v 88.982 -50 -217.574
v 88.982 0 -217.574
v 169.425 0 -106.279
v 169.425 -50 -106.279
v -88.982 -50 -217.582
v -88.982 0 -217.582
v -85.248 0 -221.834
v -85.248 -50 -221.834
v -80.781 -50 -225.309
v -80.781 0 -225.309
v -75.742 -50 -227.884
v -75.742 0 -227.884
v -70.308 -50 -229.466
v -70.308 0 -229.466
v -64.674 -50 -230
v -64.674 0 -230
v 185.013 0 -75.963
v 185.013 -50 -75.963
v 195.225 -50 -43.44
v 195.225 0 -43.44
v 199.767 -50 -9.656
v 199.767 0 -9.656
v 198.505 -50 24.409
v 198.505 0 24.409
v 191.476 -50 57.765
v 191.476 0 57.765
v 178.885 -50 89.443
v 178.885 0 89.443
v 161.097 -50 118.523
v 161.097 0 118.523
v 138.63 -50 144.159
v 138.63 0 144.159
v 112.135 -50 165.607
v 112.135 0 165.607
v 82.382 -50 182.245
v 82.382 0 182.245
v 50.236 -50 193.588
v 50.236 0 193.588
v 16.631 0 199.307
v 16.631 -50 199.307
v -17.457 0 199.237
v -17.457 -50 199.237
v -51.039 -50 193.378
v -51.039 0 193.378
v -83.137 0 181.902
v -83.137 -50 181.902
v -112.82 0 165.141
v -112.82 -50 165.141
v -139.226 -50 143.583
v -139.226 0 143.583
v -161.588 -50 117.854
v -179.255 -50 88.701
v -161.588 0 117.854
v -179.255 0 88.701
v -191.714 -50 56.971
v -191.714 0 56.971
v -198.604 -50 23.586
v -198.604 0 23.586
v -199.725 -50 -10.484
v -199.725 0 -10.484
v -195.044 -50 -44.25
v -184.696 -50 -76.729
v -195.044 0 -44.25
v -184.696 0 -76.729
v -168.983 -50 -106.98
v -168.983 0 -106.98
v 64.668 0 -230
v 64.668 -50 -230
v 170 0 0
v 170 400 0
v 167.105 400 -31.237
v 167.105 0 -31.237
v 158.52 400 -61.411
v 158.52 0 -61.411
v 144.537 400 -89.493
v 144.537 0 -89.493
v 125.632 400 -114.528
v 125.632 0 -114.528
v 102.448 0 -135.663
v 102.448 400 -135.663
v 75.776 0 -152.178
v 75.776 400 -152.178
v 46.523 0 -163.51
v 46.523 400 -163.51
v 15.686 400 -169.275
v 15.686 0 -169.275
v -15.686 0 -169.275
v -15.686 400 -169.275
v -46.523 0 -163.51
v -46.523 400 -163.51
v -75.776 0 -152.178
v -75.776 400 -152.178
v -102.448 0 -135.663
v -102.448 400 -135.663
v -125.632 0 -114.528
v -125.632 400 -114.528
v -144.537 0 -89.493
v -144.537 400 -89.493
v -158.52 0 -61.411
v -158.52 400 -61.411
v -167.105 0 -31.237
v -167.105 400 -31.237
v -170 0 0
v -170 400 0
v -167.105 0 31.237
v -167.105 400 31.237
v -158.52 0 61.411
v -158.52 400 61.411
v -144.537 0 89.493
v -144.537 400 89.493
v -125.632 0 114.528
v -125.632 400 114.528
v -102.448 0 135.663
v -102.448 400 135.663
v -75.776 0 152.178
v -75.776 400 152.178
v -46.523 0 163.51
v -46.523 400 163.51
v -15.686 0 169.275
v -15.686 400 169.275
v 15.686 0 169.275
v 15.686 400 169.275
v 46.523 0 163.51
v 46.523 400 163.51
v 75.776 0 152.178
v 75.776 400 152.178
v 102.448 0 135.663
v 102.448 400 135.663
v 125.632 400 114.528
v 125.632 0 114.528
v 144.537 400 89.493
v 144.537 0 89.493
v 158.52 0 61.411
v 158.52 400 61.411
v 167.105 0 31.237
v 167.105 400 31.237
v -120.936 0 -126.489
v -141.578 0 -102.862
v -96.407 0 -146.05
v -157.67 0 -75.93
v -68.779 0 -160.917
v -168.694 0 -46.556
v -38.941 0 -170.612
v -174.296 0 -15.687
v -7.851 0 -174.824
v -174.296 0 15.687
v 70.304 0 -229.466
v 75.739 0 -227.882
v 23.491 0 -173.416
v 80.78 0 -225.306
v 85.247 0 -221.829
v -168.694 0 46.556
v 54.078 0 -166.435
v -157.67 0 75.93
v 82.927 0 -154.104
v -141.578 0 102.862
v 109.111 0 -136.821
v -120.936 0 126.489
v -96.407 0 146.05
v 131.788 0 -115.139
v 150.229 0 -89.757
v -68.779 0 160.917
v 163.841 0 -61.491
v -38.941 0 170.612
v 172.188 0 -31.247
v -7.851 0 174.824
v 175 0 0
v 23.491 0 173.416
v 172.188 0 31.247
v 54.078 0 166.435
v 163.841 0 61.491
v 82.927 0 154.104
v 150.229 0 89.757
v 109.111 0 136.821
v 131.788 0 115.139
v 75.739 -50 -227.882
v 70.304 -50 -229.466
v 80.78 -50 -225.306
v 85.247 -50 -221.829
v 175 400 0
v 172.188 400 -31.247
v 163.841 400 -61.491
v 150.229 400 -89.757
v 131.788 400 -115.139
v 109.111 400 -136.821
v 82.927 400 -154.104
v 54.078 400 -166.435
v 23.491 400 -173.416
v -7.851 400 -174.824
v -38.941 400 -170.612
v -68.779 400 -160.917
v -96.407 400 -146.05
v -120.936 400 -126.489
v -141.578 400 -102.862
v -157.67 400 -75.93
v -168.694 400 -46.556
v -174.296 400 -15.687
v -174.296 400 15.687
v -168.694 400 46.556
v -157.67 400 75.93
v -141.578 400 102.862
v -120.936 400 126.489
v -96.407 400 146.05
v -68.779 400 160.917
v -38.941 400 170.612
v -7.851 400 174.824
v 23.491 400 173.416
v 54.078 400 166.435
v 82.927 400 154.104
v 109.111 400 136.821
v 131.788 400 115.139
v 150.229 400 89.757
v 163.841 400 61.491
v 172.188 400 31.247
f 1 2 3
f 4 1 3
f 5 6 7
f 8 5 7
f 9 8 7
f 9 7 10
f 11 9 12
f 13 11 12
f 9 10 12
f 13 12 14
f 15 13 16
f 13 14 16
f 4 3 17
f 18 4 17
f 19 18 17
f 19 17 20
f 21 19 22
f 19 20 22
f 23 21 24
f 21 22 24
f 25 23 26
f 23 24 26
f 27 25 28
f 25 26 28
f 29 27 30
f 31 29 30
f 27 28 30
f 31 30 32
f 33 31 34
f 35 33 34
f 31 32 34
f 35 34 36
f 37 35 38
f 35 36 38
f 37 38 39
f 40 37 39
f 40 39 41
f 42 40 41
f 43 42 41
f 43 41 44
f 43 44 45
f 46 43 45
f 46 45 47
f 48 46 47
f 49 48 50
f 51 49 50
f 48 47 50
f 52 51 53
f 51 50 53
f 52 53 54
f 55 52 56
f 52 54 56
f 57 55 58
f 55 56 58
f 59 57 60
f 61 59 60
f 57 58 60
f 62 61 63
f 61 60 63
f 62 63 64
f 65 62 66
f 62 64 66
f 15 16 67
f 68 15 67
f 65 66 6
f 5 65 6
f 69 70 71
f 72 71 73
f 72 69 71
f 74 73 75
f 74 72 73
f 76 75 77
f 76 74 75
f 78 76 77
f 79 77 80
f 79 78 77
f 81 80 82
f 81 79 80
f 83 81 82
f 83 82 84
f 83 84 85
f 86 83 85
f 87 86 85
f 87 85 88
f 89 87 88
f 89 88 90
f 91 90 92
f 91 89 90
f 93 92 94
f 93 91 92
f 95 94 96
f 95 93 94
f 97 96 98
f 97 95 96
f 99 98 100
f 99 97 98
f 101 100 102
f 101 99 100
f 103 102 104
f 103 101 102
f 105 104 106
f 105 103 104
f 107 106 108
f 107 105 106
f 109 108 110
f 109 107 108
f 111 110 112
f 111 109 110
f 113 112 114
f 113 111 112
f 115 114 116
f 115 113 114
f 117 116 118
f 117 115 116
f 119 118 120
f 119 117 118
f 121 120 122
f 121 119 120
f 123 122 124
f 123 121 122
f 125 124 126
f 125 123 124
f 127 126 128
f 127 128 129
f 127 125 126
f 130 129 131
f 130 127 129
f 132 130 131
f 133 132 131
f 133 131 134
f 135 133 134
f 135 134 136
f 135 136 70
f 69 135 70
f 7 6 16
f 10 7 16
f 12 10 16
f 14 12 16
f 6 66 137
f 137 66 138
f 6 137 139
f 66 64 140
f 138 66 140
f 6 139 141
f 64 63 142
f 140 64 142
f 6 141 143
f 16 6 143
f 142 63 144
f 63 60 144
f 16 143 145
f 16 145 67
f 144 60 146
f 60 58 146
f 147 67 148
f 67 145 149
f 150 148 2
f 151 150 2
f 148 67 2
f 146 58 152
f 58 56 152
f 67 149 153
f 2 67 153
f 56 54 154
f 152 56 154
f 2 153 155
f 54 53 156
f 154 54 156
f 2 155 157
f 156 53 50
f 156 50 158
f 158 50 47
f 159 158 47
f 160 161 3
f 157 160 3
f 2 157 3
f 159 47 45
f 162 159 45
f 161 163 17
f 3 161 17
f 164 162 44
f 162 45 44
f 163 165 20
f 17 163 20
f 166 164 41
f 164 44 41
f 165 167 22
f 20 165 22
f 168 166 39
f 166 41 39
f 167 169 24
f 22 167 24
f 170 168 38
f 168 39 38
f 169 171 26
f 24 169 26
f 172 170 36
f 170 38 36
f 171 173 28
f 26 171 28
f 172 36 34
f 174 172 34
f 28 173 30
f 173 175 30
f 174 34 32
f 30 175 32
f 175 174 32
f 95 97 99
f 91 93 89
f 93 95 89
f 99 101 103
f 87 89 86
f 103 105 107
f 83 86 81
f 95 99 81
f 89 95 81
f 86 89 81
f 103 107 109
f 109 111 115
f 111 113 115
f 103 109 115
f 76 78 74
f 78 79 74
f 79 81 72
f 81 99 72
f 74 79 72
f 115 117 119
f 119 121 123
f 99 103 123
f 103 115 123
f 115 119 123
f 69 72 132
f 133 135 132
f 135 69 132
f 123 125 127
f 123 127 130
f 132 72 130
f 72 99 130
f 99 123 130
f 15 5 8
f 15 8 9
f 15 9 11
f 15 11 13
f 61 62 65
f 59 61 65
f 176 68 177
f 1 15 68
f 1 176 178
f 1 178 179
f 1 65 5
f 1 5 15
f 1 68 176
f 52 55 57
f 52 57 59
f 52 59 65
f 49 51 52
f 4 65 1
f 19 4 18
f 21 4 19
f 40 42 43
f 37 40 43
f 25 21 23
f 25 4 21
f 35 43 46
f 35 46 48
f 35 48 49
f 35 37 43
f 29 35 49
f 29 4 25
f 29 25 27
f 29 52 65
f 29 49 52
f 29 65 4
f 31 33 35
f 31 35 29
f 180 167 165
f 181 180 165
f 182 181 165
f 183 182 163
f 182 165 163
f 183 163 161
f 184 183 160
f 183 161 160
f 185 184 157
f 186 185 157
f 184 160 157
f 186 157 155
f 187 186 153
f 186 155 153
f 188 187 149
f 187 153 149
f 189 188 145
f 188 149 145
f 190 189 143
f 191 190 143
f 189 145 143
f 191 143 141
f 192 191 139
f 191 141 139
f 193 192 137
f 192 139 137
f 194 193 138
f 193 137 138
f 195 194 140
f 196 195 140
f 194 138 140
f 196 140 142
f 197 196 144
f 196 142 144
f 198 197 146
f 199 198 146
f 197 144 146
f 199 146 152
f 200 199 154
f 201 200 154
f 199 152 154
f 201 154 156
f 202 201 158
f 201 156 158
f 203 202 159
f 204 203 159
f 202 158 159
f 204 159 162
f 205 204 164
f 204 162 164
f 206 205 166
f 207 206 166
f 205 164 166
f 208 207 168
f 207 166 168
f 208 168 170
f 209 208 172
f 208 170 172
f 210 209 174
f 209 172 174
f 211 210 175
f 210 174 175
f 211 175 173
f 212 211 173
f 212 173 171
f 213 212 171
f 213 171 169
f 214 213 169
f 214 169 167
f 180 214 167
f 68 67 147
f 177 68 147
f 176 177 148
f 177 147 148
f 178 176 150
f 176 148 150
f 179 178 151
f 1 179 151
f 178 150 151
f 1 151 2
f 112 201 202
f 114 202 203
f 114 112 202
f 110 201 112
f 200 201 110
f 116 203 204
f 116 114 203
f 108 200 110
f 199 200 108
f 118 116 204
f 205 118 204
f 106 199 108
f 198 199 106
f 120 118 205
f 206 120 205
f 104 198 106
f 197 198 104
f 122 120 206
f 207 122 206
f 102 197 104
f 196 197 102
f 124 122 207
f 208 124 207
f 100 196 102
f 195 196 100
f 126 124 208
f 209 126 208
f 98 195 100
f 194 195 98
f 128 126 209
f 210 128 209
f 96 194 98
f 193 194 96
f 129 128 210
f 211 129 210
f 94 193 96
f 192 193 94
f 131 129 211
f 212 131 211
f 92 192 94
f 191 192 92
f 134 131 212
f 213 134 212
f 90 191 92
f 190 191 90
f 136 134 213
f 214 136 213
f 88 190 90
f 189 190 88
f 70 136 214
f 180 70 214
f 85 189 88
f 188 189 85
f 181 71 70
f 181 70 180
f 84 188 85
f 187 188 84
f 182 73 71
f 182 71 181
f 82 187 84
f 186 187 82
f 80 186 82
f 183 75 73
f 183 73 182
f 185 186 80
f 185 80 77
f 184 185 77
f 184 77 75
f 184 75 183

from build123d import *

# Parameters (mm, degrees)
SKETCH_1_R        = 175
SKETCH_1_R_2      = 170
EXTRUDE_1_DEPTH   = 400
EXTRUDE_1_2_DEPTH = 50


with BuildPart() as part:
    # Эскиз1 → Extrude 1 (new body)
    with BuildSketch(Plane(origin=(0, 0, 0), x_dir=(1, 0, 0), z_dir=(0, 1, 0))):
        Circle(SKETCH_1_R)
        Circle(SKETCH_1_R_2, mode=Mode.SUBTRACT)
    extrude(amount=EXTRUDE_1_DEPTH)

    # Эскиз2 → Extrude 1 2 (add)
    with BuildSketch(Plane.XZ):
        with BuildLine():
            Line((-64.674331545, -230), (64.667769704, -230))
            ThreePointArc((64.667769704, -230), (78.320322733, -226.713438487), (88.981545406, -217.573853052))
            Line((88.981545406, -217.573853052), (169.425013579, -106.278712703))
            ThreePointArc((169.425013579, -106.278712703), (-0.414705995, 199.999570047), (-168.982813438, -106.980412985))
            Line((-168.982813438, -106.980412985), (-88.982009615, -217.582286166))
            ThreePointArc((-88.982009615, -217.582286166), (-78.322251075, -226.715806042), (-64.674331545, -230))
        make_face()
    extrude(amount=EXTRUDE_1_2_DEPTH)


solid = part.part
